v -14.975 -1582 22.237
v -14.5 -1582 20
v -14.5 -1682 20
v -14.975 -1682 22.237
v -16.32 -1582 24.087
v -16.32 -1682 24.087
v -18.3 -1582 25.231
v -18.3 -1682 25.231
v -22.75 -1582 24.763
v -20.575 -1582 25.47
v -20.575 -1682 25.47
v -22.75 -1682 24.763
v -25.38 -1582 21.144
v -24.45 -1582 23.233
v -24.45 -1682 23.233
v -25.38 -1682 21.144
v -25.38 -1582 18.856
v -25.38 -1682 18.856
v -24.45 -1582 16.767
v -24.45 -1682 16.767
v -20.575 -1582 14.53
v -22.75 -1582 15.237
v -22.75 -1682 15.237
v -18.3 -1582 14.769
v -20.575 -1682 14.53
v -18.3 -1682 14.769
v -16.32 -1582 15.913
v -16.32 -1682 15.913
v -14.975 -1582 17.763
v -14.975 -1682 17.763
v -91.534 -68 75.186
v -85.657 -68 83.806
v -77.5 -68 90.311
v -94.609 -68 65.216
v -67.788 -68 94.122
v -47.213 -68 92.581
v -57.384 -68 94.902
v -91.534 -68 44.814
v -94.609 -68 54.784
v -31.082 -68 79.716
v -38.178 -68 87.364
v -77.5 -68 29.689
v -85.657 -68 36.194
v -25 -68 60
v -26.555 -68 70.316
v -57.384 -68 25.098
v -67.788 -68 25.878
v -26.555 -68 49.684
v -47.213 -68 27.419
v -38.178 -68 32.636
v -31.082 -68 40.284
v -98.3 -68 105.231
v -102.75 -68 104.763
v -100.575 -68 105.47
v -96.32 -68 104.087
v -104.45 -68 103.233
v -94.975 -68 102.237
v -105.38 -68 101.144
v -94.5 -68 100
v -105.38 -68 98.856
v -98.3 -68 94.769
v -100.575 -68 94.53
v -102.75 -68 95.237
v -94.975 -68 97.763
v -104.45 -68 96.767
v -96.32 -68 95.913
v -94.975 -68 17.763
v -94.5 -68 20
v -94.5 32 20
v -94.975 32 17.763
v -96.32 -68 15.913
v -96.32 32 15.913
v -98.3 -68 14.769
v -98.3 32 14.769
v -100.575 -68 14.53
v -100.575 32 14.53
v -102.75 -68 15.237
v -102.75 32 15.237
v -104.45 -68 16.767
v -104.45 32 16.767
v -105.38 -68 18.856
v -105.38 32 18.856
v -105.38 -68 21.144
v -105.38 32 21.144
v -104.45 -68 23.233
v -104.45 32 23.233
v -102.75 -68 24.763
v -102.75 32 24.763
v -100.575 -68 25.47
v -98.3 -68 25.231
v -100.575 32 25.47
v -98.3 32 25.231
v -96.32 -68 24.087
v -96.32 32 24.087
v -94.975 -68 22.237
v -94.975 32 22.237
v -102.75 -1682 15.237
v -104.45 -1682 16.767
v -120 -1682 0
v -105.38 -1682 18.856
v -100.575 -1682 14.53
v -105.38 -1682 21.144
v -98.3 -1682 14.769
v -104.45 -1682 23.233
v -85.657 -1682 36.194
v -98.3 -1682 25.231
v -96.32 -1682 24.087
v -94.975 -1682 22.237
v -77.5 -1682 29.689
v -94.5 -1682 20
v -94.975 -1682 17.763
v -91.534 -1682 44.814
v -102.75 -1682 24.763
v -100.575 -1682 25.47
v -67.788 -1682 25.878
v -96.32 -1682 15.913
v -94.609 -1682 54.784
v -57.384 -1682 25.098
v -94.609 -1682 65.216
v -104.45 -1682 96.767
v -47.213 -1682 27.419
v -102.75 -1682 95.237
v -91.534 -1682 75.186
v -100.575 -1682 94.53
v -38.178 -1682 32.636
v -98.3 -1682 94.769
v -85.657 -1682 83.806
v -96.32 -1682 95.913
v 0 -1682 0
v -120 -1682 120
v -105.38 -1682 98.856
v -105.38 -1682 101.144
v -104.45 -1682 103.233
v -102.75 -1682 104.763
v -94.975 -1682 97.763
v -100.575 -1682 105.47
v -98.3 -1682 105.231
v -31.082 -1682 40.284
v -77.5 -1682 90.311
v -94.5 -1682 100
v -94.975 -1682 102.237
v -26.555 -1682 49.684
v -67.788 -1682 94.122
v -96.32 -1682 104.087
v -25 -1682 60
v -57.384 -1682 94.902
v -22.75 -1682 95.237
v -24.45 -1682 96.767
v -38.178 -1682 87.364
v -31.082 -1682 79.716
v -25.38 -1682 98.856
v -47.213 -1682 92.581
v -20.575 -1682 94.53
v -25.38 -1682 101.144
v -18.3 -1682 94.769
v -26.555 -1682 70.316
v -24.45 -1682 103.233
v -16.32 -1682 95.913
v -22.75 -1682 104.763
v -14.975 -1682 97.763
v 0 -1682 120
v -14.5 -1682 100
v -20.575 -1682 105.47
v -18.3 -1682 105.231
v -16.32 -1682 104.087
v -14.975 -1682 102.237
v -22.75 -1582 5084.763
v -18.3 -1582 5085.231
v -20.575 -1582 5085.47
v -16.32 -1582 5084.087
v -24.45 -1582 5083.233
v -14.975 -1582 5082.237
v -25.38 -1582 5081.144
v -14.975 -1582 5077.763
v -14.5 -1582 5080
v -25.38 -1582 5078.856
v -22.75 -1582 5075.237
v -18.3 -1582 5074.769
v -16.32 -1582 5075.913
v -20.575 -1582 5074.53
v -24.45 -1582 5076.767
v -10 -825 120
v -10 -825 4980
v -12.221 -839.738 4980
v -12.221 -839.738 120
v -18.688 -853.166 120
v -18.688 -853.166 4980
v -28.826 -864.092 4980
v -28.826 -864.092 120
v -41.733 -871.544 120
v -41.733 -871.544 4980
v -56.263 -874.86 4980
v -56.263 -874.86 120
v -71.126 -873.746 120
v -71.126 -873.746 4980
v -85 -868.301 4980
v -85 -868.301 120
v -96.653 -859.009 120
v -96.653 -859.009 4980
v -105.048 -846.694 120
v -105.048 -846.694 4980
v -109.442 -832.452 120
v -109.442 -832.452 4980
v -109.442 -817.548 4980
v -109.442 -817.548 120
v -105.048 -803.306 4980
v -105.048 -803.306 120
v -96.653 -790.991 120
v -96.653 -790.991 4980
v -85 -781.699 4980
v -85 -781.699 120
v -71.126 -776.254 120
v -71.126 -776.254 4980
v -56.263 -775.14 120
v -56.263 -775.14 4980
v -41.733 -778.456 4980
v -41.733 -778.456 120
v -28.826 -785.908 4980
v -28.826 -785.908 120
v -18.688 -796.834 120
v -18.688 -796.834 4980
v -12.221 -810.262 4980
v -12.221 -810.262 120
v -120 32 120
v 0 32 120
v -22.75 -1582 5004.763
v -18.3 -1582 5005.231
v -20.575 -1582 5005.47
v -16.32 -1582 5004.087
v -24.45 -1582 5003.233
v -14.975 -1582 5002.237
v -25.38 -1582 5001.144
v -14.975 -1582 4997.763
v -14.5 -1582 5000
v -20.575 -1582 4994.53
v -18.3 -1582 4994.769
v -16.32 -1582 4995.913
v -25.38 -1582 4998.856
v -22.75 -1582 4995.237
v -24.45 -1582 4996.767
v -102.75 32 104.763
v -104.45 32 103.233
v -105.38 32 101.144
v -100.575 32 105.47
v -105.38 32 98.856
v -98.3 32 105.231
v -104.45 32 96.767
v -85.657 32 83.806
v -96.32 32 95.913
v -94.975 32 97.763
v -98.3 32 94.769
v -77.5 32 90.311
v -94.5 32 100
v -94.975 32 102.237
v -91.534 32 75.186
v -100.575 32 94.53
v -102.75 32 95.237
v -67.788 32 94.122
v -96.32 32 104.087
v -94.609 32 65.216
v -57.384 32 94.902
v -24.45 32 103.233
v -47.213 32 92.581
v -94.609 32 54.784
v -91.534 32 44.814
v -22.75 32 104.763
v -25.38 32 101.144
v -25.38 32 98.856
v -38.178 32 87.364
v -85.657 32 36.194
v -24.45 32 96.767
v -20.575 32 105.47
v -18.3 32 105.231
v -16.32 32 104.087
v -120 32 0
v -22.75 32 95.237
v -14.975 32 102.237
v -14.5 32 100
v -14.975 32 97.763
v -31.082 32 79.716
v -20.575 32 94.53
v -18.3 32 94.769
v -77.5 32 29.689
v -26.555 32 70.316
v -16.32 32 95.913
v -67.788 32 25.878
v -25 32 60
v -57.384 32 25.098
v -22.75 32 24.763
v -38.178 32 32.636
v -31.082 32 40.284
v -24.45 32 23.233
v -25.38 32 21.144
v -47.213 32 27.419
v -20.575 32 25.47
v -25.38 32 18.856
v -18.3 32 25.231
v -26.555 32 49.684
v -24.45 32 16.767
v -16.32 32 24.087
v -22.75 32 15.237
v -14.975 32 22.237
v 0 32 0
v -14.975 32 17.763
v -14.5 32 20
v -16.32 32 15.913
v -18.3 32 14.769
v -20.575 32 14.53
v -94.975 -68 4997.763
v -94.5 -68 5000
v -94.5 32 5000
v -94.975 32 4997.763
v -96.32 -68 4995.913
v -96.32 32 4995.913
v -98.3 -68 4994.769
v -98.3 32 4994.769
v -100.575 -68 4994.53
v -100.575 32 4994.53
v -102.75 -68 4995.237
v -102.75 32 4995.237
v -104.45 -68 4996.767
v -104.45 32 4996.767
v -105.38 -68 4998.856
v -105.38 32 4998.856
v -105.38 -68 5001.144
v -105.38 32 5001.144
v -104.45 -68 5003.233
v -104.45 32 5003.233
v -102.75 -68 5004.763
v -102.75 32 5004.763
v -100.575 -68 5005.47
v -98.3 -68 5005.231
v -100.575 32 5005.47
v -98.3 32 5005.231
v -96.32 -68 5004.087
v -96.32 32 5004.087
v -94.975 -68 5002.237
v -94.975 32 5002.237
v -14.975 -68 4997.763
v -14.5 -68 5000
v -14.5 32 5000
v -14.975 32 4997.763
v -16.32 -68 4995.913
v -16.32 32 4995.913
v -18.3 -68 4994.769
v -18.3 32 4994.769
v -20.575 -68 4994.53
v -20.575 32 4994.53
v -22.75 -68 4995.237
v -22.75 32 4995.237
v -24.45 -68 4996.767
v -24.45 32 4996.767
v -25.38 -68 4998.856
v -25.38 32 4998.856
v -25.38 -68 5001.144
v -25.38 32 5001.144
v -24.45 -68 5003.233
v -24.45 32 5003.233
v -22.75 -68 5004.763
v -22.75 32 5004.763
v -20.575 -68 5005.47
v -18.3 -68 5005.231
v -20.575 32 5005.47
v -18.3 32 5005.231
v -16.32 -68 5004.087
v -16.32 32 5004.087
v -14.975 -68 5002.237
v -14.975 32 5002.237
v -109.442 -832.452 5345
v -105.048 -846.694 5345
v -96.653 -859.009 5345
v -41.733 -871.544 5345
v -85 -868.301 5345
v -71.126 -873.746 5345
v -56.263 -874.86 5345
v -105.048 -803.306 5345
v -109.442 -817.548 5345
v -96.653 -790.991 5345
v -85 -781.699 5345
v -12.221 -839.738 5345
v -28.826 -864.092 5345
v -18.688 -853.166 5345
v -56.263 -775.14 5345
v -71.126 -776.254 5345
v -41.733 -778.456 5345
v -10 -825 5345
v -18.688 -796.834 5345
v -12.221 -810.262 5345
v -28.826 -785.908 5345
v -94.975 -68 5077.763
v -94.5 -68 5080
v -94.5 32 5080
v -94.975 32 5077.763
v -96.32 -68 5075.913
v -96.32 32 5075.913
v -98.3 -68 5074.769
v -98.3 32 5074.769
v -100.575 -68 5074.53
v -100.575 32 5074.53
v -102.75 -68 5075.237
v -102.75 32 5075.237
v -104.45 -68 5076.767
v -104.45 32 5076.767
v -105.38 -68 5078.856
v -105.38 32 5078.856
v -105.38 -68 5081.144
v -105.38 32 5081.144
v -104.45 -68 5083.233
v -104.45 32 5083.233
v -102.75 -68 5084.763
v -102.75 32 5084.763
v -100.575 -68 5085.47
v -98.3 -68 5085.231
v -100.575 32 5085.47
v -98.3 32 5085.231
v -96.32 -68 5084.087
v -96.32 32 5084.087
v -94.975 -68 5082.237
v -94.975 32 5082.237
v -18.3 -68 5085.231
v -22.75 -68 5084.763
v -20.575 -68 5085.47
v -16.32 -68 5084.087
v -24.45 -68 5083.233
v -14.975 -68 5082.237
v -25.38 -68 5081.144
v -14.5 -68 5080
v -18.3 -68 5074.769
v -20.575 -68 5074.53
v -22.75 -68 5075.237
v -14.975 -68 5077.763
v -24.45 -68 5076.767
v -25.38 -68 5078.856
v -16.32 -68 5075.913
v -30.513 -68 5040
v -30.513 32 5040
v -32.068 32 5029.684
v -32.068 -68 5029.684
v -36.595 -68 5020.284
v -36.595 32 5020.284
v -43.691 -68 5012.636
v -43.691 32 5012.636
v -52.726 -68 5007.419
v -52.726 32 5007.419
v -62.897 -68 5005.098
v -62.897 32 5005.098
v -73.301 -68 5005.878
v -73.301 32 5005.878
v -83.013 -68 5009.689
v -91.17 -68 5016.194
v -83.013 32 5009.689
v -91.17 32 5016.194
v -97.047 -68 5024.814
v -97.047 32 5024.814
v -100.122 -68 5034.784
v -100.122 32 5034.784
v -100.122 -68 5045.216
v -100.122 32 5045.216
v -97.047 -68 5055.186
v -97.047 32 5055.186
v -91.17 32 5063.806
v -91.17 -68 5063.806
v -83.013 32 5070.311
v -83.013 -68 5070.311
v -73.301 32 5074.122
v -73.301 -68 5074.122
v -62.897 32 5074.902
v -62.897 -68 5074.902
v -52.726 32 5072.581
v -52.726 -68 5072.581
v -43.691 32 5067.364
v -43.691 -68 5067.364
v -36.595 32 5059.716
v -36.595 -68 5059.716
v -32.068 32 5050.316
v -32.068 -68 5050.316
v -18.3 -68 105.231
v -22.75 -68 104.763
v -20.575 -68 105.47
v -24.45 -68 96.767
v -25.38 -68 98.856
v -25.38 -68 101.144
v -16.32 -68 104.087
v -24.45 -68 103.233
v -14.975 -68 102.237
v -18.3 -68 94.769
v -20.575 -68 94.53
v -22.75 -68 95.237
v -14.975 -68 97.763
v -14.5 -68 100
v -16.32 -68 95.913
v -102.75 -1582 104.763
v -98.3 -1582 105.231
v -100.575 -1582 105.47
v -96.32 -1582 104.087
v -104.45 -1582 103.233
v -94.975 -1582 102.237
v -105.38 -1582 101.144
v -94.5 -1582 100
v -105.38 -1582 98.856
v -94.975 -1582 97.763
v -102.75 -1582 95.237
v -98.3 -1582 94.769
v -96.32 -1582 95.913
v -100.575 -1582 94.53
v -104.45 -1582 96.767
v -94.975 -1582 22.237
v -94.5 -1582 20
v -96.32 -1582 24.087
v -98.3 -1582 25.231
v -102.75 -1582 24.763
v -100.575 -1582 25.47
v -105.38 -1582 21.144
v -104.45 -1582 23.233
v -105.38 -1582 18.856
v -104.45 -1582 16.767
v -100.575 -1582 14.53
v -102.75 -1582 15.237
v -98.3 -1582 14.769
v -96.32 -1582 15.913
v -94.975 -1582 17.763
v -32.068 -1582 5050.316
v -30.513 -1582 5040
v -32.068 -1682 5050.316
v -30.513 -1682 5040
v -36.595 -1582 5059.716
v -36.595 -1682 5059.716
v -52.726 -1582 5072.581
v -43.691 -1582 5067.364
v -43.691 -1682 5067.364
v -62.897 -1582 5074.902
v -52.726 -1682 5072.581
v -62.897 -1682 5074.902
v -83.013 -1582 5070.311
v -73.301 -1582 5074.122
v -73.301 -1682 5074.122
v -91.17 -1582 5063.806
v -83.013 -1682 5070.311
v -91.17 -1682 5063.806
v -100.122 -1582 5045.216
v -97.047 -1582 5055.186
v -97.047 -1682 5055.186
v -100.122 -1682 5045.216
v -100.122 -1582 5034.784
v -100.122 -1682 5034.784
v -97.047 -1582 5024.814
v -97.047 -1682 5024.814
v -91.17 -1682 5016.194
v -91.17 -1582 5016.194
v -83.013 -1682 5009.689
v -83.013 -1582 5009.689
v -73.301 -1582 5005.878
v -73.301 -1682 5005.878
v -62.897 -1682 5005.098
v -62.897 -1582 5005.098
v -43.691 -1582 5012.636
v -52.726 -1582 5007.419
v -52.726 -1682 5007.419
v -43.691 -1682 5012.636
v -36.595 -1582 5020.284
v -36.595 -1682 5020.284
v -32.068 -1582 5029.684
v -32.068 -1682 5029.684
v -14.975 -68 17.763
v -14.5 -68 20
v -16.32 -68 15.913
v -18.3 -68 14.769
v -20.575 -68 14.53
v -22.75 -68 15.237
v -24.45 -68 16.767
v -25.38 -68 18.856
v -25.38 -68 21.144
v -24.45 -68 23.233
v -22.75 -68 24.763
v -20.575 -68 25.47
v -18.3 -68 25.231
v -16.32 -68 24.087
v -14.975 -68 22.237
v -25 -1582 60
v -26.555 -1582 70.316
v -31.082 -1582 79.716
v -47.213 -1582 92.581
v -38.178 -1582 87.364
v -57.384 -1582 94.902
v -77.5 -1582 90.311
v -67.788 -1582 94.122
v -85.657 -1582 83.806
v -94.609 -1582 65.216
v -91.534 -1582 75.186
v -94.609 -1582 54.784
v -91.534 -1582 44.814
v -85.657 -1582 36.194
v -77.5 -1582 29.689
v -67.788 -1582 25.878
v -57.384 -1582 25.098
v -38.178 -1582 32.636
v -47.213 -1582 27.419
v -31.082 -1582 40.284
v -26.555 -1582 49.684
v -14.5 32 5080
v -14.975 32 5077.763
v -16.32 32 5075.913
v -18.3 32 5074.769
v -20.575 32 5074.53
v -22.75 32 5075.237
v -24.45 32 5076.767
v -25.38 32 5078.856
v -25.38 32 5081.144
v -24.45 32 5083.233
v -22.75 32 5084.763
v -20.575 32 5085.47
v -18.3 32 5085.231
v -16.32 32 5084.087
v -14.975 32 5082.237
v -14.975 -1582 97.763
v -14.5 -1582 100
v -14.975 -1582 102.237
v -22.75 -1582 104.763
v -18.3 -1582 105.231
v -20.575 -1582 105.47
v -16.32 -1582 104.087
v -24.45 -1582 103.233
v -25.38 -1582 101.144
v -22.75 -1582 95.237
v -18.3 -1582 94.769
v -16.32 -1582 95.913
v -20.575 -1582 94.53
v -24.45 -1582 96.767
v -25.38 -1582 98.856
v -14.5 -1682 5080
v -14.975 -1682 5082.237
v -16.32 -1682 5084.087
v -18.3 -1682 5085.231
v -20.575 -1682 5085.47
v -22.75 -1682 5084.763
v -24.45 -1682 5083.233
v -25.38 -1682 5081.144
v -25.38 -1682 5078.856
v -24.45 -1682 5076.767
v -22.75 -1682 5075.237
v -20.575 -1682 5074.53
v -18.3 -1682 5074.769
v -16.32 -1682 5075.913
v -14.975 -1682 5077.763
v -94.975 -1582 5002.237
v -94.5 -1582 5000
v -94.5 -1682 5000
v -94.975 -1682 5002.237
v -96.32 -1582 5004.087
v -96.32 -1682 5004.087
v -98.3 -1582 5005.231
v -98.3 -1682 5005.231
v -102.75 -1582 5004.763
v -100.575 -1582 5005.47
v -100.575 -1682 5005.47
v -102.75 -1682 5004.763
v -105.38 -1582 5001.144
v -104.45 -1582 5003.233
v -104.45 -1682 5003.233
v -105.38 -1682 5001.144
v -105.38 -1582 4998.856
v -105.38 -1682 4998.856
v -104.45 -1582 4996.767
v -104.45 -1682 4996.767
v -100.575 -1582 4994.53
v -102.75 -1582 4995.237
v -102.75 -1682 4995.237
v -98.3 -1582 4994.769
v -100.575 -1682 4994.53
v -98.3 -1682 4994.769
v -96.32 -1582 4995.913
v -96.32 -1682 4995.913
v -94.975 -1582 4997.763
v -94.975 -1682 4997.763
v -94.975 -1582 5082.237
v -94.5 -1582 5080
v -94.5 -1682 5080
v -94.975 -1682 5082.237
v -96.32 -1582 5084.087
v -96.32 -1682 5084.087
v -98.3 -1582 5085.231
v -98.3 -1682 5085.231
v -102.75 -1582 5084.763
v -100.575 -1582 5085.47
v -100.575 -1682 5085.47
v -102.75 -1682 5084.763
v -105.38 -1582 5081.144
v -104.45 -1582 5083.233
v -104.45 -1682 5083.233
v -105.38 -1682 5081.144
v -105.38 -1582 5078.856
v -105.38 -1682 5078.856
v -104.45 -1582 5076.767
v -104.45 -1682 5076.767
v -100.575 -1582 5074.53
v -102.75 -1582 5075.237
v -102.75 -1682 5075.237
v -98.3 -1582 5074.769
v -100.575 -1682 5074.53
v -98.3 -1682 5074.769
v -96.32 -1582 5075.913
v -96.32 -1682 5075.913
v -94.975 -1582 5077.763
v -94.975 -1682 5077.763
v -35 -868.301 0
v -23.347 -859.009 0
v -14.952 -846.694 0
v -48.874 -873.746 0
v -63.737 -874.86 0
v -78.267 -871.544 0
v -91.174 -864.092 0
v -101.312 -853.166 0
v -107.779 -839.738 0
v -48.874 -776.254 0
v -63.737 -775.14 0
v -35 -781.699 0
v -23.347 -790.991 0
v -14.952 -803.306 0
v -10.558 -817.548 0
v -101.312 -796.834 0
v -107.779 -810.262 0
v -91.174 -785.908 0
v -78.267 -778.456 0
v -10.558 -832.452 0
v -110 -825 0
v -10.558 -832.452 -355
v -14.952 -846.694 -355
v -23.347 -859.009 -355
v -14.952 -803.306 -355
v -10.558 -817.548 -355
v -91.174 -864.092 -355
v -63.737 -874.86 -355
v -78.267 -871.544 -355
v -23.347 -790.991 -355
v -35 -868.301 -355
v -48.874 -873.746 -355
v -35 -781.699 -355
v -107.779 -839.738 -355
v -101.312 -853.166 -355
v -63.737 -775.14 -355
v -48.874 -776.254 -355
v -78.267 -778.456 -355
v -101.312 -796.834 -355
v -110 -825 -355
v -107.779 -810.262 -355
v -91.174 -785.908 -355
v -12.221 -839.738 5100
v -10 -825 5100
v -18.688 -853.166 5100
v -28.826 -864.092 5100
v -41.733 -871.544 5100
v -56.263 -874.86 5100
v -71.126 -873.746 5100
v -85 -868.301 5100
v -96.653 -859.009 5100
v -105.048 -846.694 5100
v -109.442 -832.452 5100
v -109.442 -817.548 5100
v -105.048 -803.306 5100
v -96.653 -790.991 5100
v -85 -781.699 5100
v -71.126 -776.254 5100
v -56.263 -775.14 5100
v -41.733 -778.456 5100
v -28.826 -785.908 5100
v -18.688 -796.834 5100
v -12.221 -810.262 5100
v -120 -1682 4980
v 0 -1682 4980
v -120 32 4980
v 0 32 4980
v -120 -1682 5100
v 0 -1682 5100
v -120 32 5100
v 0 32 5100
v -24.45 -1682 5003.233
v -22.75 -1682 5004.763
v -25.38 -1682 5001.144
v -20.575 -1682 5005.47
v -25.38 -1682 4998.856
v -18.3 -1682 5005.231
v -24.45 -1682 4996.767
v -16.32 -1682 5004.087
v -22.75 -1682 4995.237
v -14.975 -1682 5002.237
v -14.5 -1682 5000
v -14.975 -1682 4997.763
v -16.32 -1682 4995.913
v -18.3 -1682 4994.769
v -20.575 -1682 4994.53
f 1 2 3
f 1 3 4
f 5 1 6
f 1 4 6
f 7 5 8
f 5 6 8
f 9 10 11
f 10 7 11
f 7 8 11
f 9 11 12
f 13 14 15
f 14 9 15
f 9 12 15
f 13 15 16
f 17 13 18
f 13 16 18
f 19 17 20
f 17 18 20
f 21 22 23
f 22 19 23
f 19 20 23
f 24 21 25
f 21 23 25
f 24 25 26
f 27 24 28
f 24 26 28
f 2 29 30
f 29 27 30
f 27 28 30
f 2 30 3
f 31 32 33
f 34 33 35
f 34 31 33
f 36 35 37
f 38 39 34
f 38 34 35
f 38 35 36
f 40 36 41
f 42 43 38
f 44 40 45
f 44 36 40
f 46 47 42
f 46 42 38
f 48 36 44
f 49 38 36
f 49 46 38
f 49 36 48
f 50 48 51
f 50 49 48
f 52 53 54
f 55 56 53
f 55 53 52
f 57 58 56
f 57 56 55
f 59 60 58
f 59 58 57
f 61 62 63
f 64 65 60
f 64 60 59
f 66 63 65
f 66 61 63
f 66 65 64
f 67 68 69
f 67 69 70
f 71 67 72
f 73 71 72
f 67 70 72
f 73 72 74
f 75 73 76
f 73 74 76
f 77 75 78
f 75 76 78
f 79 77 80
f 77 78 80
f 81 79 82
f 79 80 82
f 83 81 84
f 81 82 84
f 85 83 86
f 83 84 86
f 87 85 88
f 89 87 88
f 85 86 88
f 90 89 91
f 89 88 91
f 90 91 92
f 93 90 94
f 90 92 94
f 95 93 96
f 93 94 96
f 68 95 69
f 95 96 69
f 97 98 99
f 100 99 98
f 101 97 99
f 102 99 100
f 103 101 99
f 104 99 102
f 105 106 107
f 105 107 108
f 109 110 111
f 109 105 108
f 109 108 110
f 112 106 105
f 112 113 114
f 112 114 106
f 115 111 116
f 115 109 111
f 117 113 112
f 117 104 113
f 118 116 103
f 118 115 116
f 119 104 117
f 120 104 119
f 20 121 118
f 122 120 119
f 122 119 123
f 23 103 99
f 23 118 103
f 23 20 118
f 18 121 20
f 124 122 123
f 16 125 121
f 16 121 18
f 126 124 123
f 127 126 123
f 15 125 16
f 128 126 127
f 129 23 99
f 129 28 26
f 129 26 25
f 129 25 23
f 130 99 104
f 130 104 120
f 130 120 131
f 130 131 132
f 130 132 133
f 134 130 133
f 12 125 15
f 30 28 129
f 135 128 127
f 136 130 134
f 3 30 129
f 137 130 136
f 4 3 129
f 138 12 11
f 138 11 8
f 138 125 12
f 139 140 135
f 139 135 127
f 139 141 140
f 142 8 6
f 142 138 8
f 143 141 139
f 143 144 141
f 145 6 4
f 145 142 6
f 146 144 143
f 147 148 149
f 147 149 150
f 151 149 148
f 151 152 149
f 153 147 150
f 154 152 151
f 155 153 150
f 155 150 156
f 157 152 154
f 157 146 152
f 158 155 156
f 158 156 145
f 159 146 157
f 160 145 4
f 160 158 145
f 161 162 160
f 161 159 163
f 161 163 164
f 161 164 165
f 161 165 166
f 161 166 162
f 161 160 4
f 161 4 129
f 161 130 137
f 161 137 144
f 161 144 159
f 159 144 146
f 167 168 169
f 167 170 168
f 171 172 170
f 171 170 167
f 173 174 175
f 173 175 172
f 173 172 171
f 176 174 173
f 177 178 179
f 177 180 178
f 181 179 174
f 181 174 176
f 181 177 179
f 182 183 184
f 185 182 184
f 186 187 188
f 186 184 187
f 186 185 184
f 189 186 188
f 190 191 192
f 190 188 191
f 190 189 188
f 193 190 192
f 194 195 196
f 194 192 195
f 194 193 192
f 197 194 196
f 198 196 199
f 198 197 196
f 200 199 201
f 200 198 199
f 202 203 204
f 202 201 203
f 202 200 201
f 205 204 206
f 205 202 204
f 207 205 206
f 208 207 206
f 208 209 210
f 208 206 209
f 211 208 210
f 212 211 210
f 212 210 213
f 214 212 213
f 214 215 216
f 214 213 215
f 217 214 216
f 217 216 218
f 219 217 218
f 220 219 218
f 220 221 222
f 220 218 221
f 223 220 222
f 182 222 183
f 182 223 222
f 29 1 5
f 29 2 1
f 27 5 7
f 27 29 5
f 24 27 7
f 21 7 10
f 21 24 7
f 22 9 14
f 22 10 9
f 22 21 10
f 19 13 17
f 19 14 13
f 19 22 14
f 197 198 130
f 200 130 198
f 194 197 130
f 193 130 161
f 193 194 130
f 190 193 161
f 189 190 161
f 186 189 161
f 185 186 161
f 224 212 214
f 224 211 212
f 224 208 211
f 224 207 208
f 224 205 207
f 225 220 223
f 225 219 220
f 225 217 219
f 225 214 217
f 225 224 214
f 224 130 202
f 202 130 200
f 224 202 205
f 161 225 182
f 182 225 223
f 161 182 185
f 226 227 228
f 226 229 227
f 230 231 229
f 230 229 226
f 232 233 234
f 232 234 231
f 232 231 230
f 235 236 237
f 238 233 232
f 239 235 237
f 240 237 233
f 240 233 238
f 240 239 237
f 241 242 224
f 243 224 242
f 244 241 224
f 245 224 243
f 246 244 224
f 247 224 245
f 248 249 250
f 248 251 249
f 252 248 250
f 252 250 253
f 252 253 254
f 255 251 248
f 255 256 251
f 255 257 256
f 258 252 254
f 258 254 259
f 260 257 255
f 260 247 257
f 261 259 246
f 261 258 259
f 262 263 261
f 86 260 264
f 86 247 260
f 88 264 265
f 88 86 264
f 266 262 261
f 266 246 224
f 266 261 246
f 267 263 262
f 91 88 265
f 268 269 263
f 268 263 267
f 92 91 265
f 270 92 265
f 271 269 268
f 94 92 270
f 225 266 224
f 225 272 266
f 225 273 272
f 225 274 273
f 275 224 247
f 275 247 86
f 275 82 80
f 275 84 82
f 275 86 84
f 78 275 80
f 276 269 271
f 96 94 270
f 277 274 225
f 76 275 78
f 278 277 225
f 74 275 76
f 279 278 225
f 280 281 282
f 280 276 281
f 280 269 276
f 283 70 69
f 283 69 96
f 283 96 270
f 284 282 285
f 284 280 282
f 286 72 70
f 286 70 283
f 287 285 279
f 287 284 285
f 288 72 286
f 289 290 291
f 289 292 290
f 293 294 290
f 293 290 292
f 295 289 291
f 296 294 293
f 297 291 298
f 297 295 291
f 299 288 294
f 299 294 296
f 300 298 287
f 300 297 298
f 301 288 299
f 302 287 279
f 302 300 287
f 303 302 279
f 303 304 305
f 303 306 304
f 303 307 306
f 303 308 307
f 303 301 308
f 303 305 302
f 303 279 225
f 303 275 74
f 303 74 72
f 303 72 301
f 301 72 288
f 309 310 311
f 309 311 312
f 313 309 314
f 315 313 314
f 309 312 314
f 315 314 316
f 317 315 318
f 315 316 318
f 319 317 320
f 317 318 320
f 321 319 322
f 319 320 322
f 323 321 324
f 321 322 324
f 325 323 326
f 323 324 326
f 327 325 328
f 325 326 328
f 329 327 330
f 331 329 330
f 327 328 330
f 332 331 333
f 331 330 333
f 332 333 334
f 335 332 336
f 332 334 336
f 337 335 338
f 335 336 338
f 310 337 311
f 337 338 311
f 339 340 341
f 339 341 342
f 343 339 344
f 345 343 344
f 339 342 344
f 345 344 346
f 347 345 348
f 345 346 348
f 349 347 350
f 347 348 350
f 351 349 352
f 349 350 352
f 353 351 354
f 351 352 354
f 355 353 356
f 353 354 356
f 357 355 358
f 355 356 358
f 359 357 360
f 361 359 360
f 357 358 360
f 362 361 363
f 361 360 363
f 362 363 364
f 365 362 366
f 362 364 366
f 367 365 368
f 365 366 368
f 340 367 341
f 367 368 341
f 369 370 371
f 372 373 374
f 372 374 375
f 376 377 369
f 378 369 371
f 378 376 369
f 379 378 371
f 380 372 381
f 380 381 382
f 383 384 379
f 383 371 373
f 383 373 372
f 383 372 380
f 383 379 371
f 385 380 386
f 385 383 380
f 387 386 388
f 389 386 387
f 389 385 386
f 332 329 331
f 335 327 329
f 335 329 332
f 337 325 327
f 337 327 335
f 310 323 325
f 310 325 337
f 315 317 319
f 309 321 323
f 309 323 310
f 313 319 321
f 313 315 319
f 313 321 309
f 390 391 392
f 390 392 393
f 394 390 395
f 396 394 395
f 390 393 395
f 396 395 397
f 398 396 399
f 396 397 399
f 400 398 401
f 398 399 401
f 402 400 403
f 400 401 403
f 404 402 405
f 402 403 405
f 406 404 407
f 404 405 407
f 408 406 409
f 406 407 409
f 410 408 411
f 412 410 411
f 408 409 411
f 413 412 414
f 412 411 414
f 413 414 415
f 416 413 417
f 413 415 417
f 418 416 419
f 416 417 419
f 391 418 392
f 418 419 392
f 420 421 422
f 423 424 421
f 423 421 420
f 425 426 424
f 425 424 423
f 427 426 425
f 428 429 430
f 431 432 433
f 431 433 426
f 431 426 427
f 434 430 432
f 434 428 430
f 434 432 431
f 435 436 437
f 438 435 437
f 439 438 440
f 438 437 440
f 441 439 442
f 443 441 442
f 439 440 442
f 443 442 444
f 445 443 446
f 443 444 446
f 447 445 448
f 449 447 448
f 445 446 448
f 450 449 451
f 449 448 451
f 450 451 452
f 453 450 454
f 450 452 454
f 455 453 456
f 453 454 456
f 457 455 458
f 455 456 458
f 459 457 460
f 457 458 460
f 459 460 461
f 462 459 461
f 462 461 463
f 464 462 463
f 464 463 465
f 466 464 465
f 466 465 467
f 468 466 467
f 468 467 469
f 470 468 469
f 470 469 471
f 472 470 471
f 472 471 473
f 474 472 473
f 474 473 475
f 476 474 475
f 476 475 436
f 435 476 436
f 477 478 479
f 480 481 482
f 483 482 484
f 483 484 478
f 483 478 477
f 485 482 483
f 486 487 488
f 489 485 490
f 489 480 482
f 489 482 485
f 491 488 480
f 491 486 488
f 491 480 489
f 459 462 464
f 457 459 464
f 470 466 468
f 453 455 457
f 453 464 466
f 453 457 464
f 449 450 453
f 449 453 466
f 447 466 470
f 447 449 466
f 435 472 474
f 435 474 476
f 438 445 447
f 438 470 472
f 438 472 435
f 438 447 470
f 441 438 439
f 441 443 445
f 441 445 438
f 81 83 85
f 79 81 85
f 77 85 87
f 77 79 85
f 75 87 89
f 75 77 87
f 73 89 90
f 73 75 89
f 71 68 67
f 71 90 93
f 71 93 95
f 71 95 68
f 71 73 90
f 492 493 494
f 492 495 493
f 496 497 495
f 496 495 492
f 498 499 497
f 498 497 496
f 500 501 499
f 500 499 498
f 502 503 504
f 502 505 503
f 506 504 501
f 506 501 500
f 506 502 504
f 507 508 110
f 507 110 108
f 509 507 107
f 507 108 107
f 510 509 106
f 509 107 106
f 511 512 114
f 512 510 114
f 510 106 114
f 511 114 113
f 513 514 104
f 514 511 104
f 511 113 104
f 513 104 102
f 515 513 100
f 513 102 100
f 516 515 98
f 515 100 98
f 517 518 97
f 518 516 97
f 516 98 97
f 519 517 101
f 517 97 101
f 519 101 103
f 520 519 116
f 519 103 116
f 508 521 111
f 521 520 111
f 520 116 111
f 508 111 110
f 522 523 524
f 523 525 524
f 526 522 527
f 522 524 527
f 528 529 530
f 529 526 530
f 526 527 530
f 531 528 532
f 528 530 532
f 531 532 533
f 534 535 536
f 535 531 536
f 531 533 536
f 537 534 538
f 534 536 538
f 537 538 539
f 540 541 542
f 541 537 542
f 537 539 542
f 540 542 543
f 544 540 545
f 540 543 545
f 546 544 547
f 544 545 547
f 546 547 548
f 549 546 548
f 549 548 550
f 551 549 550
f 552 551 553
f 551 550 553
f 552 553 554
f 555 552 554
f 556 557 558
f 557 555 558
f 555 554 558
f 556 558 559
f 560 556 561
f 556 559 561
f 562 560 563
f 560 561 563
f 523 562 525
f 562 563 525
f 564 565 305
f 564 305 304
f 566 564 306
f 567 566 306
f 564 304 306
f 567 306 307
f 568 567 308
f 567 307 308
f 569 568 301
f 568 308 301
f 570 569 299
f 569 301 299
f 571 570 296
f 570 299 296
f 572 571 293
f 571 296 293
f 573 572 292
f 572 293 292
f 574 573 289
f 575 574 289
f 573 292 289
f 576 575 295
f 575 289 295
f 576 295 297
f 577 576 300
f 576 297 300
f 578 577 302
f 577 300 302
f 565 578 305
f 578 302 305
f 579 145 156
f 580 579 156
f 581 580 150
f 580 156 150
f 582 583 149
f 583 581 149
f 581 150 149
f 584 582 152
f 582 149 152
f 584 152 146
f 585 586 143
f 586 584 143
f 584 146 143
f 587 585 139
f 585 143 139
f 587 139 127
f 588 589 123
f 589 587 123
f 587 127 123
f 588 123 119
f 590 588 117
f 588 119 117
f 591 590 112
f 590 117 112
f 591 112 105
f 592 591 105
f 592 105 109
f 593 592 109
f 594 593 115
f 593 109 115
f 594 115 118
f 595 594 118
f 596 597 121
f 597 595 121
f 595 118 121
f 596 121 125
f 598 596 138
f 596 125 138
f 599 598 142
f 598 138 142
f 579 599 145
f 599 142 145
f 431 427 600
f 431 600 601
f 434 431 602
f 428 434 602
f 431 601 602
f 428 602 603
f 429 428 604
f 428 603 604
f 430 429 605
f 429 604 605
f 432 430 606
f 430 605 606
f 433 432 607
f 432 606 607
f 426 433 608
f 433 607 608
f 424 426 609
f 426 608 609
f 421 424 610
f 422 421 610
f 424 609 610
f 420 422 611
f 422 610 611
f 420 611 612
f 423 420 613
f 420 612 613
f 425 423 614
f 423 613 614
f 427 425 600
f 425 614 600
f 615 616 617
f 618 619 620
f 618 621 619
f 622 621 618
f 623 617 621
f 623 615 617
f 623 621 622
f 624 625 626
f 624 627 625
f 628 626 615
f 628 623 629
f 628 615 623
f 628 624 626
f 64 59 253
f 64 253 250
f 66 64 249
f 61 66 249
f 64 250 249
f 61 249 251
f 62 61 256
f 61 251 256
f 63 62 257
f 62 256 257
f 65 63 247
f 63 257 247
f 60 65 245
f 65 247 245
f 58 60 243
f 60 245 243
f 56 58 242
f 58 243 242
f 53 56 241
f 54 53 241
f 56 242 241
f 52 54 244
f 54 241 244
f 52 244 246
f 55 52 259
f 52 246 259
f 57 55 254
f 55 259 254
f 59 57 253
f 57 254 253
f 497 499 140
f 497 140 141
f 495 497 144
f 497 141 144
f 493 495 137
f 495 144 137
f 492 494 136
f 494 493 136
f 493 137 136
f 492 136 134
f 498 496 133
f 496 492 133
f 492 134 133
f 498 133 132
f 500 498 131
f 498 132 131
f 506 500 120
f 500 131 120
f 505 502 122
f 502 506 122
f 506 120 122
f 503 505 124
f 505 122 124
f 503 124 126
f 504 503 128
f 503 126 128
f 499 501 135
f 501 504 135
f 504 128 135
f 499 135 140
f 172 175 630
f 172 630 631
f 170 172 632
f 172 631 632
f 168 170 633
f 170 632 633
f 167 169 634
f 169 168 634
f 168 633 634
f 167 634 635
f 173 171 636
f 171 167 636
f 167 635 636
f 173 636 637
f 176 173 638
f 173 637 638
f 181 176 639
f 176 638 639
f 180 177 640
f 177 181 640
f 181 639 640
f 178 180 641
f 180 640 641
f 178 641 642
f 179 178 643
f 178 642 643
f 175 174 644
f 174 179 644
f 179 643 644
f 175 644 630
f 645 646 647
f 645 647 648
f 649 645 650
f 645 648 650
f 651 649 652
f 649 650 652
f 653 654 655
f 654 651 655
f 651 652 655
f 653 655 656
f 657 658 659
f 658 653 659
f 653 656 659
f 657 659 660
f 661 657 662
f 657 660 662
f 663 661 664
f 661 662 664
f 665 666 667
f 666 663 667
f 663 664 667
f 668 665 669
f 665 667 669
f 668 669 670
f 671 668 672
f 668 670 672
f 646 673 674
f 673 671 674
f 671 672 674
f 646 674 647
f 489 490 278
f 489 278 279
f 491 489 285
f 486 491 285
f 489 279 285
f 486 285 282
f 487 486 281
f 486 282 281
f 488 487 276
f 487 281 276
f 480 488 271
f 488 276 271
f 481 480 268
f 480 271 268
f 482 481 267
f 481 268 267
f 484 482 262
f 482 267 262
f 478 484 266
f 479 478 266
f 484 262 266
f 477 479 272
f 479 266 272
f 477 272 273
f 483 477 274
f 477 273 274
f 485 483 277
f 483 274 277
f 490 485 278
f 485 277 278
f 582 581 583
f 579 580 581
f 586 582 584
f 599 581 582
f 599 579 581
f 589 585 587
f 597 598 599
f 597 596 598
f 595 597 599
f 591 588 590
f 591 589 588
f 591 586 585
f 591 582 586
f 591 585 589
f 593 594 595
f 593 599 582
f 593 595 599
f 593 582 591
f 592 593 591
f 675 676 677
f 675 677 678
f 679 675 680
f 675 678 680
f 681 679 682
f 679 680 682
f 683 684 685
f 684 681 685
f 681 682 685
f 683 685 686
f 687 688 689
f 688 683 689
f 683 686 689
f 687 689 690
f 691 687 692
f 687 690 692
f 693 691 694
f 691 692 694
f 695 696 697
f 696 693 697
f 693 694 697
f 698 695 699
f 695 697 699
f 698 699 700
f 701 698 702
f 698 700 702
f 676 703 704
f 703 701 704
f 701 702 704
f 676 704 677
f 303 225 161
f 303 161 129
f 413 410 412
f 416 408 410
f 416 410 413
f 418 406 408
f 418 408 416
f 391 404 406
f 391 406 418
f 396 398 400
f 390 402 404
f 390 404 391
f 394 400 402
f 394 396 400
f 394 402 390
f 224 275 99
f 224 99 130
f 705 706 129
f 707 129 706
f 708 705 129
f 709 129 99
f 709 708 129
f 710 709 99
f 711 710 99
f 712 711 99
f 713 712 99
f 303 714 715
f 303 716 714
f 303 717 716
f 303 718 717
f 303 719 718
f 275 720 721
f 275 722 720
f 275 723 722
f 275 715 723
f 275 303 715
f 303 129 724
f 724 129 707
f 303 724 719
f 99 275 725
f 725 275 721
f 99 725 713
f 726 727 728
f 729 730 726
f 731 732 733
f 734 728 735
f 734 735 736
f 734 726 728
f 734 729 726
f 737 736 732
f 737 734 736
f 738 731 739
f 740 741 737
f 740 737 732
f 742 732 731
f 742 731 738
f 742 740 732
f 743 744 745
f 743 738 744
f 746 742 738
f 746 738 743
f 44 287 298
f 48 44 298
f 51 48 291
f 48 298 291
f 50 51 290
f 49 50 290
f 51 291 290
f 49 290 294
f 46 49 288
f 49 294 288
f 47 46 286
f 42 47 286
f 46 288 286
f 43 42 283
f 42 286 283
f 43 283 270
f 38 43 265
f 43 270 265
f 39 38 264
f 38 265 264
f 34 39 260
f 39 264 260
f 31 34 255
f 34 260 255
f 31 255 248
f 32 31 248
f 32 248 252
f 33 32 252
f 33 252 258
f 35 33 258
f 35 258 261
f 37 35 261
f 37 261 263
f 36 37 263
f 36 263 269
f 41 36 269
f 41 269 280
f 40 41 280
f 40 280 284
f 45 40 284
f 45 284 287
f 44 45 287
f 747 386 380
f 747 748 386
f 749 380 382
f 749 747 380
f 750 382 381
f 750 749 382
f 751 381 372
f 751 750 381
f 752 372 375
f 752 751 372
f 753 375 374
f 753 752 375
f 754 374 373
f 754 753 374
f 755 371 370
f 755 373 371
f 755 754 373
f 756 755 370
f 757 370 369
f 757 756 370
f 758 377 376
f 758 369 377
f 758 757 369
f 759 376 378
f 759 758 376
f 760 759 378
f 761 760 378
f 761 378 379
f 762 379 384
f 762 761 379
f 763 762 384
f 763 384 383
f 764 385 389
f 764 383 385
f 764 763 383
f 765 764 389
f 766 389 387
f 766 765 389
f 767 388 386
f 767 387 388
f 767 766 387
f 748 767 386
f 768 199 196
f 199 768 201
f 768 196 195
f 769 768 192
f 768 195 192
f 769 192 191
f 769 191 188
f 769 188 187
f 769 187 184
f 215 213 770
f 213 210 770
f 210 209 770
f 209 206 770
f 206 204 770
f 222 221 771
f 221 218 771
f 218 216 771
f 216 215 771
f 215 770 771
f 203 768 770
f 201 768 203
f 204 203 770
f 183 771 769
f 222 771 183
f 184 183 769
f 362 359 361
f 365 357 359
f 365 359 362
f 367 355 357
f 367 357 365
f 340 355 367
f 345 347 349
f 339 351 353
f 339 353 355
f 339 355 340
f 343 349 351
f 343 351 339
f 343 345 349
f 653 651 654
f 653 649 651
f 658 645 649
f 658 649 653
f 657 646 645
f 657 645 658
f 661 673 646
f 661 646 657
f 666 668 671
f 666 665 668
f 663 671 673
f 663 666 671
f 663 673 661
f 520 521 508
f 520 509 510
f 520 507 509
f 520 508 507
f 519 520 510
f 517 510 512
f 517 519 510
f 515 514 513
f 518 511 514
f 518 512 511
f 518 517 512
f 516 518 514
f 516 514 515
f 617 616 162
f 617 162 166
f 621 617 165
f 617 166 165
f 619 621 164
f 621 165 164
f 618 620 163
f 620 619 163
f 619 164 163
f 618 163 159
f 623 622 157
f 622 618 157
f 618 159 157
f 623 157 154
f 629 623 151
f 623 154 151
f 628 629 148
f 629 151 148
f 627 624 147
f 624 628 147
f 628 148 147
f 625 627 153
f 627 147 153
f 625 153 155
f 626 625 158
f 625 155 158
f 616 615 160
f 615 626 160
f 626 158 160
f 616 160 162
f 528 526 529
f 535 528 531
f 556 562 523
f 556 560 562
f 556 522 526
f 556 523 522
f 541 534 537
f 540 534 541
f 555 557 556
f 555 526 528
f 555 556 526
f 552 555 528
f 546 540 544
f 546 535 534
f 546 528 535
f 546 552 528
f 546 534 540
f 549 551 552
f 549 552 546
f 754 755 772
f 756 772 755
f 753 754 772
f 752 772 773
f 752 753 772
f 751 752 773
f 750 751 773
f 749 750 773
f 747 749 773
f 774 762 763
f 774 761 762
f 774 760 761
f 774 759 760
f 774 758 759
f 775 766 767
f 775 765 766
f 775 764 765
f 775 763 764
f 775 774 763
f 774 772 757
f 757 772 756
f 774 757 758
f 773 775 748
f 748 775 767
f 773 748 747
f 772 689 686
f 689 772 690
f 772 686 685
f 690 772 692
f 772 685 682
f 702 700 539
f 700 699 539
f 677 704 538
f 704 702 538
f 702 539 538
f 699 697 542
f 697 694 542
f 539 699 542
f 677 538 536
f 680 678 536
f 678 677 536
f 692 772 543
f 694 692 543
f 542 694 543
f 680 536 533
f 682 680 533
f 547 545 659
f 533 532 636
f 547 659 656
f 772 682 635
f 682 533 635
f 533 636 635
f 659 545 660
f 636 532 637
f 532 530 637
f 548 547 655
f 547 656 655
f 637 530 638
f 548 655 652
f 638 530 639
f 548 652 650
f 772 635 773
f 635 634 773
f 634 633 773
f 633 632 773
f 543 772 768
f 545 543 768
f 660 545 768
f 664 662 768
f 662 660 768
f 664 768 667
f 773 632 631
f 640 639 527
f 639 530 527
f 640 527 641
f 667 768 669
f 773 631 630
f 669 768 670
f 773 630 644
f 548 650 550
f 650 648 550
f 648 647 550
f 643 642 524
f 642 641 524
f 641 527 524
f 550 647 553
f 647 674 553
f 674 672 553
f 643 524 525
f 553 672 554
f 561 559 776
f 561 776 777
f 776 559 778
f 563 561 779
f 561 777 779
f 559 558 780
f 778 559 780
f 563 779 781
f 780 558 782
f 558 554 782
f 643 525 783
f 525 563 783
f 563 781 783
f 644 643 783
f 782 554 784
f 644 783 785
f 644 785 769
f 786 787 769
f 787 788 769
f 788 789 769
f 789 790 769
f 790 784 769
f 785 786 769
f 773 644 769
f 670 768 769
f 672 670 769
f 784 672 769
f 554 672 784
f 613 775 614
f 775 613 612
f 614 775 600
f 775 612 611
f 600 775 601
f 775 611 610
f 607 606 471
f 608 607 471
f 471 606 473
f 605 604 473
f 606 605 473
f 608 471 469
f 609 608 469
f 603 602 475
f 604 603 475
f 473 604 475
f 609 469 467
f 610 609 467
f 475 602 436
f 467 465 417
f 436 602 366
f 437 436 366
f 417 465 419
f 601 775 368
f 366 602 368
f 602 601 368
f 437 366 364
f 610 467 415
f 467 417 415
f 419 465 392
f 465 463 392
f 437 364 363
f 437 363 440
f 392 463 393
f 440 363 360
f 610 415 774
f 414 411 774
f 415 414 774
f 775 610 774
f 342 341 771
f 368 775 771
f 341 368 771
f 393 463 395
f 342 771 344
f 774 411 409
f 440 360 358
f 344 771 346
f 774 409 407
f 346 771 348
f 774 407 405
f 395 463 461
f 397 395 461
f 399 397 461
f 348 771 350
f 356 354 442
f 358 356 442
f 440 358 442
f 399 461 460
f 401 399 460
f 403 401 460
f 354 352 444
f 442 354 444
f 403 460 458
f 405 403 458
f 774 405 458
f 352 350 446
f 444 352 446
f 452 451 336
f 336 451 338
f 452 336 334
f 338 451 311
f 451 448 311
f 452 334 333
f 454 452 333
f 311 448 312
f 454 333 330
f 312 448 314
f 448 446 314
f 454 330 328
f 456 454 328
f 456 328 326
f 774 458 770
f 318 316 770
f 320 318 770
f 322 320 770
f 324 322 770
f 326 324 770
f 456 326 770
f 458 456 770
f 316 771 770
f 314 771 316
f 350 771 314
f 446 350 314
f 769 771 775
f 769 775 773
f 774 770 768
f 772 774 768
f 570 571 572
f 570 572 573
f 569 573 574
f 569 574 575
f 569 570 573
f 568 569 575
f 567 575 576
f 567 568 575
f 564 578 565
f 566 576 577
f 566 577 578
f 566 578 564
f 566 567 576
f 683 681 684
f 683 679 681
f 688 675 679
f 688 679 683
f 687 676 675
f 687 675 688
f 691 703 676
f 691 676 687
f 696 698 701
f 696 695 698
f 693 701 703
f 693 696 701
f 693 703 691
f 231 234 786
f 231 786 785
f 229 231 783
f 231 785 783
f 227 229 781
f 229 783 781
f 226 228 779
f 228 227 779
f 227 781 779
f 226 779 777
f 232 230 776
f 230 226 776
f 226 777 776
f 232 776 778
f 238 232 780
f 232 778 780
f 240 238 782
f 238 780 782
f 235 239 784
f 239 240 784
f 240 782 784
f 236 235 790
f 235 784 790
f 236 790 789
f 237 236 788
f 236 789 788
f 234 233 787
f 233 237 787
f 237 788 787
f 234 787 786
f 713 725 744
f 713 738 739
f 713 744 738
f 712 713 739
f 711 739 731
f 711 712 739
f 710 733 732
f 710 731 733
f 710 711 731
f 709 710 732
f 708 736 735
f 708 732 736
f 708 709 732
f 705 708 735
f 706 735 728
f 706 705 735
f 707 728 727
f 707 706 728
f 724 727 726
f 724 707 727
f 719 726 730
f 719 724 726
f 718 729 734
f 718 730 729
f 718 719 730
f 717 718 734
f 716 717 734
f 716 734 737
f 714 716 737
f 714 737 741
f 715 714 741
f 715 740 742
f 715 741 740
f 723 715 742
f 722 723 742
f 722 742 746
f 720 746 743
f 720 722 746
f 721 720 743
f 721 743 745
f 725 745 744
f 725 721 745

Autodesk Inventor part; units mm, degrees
ref_plane "YZ Plane" through (0, 0, 0) normal (1, 0, 0) x (0, 1, 0)
ref_plane "XZ Plane" through (0, 0, 0) normal (0, 1, 0) x (-1, 0, 0)
sketch "Sketch1" plane through (0, 0, 0) normal (0, 0, 1) x (1, 0, 0)
  line L0 (0, 0) -> (-120, 0)
  line L1 (-120, 0) -> (-120, -1650)
  line L2 (-120, -1650) -> (0, -1650)
  line L3 (0, -1650) -> (0, 0)
  dimension "d0" = 120
  dimension "d1" = 1650
extrude "Extrusion1" add sketch "Sketch1" along normal blind 120
sketch "Sketch2" plane through (0, 0, 120) normal (0, 0, 1) x (1, 0, 0)
  circle A0 centre (-60, -825) radius 50
  line L0 (-120, -1650) -> (0, -1650) projected
  line L1 (-120, 0) -> (-120, -1650) projected
  point P0 (0, 0)
  point P1 (-60, -1650)
  point P2 (-120, -825)
  dimension "d4" = 100
  dimension "d6" = 825
  dimension "d8" = 60
extrude "Extrusion2" add sketch "Sketch2" along normal blind 4860
sketch "Sketch11" plane through (0, 0, 0) normal (0, 0, -1) x (-1, 0, 0)
  circle A0 centre (60, -825) radius 50 projected
  circle A1 centre (60, -825) radius 50
  point P0 (0, 0)
  dimension "d52" = 100
extrude "Extrusion6" add sketch "Sketch11" along normal blind 130
sketch "Sketch12" plane through (-60, -825, -130) normal (0, 0, -1) x (-1, 0, 0)
  circle A0 centre (0, 0) radius 50
  point P0 (-60, 825)
  dimension "d48" = 100
  dimension "d49" = 827.1789
extrude "Extrusion7" add sketch "Sketch12" along normal blind 115
sketch "Sketch13" plane through (-120, 0, 0) normal (0, 1, 0) x (1, 0, 0)
  line L0 (120, 0) -> (120, -120) projected
  line L1 (120, -120) -> (0, -120) projected
  line L2 (120, 0) -> (0, 0)
  line L3 (0, 0) -> (0, -120)
  line L4 (0, -120) -> (120, -120)
  line L5 (120, -120) -> (120, 0)
extrude "Extrusion8" add sketch "Sketch13" along normal blind 32
sketch "Sketch14" plane through (-120, 32, 0) normal (0, 1, 0) x (1, 0, 0)
  circle A0 centre (20, -100) radius 5.5
  circle A1 centre (20, -20) radius 5.5
  circle A2 centre (100, -100) radius 5.5
  circle A3 centre (100, -20) radius 5.5
  circle A4 centre (60, -60) radius 35
  line L0 (0, 0) -> (0, -120) projected
  line L1 (0, -120) -> (120, -120) projected
  line L2 (120, 0) -> (0, 0) projected
  line L3 (120, -120) -> (120, 0) projected
  dimension "d59" = 20
  dimension "d60" = 20
  dimension "d61" = 20
  dimension "d62" = 11
  dimension "d63" = 11
  dimension "d64" = 11
  dimension "d65" = 11
  dimension "d66" = 20
  dimension "d67" = 20
  dimension "d68" = 20
  dimension "d69" = 20
  dimension "d70" = 20
  dimension "d71" = 70
  dimension "d72" = 60
  dimension "d73" = 60
extrude "Extrusion9" cut sketch "Sketch14" against normal blind 100 contours A0 | A1 | A2 | A3
extrude "Extrusion10" cut sketch "Sketch14" against normal blind 100 contours A4
sketch "Sketch15" plane through (-60, -825, 4980) normal (0, 0, 1) x (1, 0, 0)
  line L0 (60, 857) -> (60, -857) projected
  line L1 (-60, -857) -> (60, -857)
  line L2 (60, -857) -> (60, 857)
  line L3 (60, 857) -> (-60, 857)
  line L4 (-60, 857) -> (-60, -857)
  line L5 (-60, -857) -> (60, 857) construction
  line L6 (60, -857) -> (-60, 857) construction
  point P0 (60, 825)
  point P1 (0, 0)
  dimension "d79" = 4.005
  dimension "d80" = 120
extrude "Extrusion11" add sketch "Sketch15" along normal blind 120
sketch "Sketch16" plane through (-120, 32, 4980) normal (0, 1, 0) x (1, 0, 0)
  circle A0 centre (20, -100) radius 5.5
  circle A1 centre (20, -20) radius 5.5
  circle A2 centre (100, -100) radius 5.5
  circle A3 centre (100, -20) radius 5.5
  circle A4 centre (54.487, -60) radius 35
  line L0 (0, 0) -> (0, -120) projected
  line L1 (120, -120) -> (0, -120) projected
  line L2 (120, 0) -> (0, 0) projected
  line L3 (120, 0) -> (120, -120) projected
  point P0 (120, 4980)
  dimension "d83" = 11
  dimension "d84" = 11
  dimension "d85" = 11
  dimension "d86" = 11
  dimension "d87" = 20
  dimension "d88" = 20
  dimension "d89" = 20
  dimension "d90" = 20
  dimension "d91" = 20
  dimension "d92" = 20
  dimension "d93" = 20
  dimension "d94" = 20
  dimension "d95" = 60
  dimension "d96" = 70
  dimension "d97" = 65.513
extrude "Extrusion12" cut sketch "Sketch16" against normal blind 100 contours A0 | A1 | A2 | A3
extrude "Extrusion13" cut sketch "Sketch16" against normal blind 100 contours A4
sketch "Sketch17" plane through (-60, -825, 5100) normal (0, 0, 1) x (1, 0, 0)
  circle A0 centre (0, 0) radius 50
  point P0 (60, 825)
  dimension "d102" = 100
  dimension "d103" = 827.1789
extrude "Extrusion14" add sketch "Sketch17" along normal blind 130
sketch "Sketch18" plane through (-60, -825, 5230) normal (0, 0, 1) x (1, 0, 0)
  circle A0 centre (0, 0) radius 50
  point P0 (60, 825)
  dimension "d106" = 100
  dimension "d107" = 827.1789
extrude "Extrusion15" add sketch "Sketch18" along normal blind 115
sketch "Sketch20" plane through (-60, -825, -245) normal (0, 0, -1) x (-1, 0, 0)
  circle A0 centre (0, 0) radius 50
  point P0 (-60, 825)
  dimension "d113" = 100
  dimension "d114" = 827.1789
extrude "Extrusion16" add sketch "Sketch20" along normal blind 50
sketch "Sketch21" plane through (-120, -1650, 0) normal (0, -1, 0) x (1, 0, 0)
  line L0 (0, 0) -> (0, 120) projected
  line L1 (0, 120) -> (120, 120)
  line L2 (120, 120) -> (120, 0)
  line L3 (120, 0) -> (0, 0)
  line L4 (0, 0) -> (0, 120)
extrude "Extrusion17" add sketch "Sketch21" along normal blind 32
ref_plane "Work Plane6" through (-120, -825, 0) normal (0, 1, 0) x (1, 0, 0)
mirror "Mirror7" about plane through (-120, -825, 0) normal (0, 1, 0) of "Extrusion10", "Extrusion9"
mirror "Mirror8" about plane through (-120, -825, 0) normal (0, 1, 0) of "Extrusion13", "Extrusion12"
sketch "Sketch22" plane through (-60, -825, -295) normal (0, 0, -1) x (-1, 0, 0)
  circle A0 centre (0, 0) radius 50 projected
  circle A1 centre (0, 0) radius 50
  point P0 (-60, 825)
extrude "Extrusion18" add sketch "Sketch22" along normal blind 60
properties part number "Soporte Superior bandeja" material "Steel, Mild"
